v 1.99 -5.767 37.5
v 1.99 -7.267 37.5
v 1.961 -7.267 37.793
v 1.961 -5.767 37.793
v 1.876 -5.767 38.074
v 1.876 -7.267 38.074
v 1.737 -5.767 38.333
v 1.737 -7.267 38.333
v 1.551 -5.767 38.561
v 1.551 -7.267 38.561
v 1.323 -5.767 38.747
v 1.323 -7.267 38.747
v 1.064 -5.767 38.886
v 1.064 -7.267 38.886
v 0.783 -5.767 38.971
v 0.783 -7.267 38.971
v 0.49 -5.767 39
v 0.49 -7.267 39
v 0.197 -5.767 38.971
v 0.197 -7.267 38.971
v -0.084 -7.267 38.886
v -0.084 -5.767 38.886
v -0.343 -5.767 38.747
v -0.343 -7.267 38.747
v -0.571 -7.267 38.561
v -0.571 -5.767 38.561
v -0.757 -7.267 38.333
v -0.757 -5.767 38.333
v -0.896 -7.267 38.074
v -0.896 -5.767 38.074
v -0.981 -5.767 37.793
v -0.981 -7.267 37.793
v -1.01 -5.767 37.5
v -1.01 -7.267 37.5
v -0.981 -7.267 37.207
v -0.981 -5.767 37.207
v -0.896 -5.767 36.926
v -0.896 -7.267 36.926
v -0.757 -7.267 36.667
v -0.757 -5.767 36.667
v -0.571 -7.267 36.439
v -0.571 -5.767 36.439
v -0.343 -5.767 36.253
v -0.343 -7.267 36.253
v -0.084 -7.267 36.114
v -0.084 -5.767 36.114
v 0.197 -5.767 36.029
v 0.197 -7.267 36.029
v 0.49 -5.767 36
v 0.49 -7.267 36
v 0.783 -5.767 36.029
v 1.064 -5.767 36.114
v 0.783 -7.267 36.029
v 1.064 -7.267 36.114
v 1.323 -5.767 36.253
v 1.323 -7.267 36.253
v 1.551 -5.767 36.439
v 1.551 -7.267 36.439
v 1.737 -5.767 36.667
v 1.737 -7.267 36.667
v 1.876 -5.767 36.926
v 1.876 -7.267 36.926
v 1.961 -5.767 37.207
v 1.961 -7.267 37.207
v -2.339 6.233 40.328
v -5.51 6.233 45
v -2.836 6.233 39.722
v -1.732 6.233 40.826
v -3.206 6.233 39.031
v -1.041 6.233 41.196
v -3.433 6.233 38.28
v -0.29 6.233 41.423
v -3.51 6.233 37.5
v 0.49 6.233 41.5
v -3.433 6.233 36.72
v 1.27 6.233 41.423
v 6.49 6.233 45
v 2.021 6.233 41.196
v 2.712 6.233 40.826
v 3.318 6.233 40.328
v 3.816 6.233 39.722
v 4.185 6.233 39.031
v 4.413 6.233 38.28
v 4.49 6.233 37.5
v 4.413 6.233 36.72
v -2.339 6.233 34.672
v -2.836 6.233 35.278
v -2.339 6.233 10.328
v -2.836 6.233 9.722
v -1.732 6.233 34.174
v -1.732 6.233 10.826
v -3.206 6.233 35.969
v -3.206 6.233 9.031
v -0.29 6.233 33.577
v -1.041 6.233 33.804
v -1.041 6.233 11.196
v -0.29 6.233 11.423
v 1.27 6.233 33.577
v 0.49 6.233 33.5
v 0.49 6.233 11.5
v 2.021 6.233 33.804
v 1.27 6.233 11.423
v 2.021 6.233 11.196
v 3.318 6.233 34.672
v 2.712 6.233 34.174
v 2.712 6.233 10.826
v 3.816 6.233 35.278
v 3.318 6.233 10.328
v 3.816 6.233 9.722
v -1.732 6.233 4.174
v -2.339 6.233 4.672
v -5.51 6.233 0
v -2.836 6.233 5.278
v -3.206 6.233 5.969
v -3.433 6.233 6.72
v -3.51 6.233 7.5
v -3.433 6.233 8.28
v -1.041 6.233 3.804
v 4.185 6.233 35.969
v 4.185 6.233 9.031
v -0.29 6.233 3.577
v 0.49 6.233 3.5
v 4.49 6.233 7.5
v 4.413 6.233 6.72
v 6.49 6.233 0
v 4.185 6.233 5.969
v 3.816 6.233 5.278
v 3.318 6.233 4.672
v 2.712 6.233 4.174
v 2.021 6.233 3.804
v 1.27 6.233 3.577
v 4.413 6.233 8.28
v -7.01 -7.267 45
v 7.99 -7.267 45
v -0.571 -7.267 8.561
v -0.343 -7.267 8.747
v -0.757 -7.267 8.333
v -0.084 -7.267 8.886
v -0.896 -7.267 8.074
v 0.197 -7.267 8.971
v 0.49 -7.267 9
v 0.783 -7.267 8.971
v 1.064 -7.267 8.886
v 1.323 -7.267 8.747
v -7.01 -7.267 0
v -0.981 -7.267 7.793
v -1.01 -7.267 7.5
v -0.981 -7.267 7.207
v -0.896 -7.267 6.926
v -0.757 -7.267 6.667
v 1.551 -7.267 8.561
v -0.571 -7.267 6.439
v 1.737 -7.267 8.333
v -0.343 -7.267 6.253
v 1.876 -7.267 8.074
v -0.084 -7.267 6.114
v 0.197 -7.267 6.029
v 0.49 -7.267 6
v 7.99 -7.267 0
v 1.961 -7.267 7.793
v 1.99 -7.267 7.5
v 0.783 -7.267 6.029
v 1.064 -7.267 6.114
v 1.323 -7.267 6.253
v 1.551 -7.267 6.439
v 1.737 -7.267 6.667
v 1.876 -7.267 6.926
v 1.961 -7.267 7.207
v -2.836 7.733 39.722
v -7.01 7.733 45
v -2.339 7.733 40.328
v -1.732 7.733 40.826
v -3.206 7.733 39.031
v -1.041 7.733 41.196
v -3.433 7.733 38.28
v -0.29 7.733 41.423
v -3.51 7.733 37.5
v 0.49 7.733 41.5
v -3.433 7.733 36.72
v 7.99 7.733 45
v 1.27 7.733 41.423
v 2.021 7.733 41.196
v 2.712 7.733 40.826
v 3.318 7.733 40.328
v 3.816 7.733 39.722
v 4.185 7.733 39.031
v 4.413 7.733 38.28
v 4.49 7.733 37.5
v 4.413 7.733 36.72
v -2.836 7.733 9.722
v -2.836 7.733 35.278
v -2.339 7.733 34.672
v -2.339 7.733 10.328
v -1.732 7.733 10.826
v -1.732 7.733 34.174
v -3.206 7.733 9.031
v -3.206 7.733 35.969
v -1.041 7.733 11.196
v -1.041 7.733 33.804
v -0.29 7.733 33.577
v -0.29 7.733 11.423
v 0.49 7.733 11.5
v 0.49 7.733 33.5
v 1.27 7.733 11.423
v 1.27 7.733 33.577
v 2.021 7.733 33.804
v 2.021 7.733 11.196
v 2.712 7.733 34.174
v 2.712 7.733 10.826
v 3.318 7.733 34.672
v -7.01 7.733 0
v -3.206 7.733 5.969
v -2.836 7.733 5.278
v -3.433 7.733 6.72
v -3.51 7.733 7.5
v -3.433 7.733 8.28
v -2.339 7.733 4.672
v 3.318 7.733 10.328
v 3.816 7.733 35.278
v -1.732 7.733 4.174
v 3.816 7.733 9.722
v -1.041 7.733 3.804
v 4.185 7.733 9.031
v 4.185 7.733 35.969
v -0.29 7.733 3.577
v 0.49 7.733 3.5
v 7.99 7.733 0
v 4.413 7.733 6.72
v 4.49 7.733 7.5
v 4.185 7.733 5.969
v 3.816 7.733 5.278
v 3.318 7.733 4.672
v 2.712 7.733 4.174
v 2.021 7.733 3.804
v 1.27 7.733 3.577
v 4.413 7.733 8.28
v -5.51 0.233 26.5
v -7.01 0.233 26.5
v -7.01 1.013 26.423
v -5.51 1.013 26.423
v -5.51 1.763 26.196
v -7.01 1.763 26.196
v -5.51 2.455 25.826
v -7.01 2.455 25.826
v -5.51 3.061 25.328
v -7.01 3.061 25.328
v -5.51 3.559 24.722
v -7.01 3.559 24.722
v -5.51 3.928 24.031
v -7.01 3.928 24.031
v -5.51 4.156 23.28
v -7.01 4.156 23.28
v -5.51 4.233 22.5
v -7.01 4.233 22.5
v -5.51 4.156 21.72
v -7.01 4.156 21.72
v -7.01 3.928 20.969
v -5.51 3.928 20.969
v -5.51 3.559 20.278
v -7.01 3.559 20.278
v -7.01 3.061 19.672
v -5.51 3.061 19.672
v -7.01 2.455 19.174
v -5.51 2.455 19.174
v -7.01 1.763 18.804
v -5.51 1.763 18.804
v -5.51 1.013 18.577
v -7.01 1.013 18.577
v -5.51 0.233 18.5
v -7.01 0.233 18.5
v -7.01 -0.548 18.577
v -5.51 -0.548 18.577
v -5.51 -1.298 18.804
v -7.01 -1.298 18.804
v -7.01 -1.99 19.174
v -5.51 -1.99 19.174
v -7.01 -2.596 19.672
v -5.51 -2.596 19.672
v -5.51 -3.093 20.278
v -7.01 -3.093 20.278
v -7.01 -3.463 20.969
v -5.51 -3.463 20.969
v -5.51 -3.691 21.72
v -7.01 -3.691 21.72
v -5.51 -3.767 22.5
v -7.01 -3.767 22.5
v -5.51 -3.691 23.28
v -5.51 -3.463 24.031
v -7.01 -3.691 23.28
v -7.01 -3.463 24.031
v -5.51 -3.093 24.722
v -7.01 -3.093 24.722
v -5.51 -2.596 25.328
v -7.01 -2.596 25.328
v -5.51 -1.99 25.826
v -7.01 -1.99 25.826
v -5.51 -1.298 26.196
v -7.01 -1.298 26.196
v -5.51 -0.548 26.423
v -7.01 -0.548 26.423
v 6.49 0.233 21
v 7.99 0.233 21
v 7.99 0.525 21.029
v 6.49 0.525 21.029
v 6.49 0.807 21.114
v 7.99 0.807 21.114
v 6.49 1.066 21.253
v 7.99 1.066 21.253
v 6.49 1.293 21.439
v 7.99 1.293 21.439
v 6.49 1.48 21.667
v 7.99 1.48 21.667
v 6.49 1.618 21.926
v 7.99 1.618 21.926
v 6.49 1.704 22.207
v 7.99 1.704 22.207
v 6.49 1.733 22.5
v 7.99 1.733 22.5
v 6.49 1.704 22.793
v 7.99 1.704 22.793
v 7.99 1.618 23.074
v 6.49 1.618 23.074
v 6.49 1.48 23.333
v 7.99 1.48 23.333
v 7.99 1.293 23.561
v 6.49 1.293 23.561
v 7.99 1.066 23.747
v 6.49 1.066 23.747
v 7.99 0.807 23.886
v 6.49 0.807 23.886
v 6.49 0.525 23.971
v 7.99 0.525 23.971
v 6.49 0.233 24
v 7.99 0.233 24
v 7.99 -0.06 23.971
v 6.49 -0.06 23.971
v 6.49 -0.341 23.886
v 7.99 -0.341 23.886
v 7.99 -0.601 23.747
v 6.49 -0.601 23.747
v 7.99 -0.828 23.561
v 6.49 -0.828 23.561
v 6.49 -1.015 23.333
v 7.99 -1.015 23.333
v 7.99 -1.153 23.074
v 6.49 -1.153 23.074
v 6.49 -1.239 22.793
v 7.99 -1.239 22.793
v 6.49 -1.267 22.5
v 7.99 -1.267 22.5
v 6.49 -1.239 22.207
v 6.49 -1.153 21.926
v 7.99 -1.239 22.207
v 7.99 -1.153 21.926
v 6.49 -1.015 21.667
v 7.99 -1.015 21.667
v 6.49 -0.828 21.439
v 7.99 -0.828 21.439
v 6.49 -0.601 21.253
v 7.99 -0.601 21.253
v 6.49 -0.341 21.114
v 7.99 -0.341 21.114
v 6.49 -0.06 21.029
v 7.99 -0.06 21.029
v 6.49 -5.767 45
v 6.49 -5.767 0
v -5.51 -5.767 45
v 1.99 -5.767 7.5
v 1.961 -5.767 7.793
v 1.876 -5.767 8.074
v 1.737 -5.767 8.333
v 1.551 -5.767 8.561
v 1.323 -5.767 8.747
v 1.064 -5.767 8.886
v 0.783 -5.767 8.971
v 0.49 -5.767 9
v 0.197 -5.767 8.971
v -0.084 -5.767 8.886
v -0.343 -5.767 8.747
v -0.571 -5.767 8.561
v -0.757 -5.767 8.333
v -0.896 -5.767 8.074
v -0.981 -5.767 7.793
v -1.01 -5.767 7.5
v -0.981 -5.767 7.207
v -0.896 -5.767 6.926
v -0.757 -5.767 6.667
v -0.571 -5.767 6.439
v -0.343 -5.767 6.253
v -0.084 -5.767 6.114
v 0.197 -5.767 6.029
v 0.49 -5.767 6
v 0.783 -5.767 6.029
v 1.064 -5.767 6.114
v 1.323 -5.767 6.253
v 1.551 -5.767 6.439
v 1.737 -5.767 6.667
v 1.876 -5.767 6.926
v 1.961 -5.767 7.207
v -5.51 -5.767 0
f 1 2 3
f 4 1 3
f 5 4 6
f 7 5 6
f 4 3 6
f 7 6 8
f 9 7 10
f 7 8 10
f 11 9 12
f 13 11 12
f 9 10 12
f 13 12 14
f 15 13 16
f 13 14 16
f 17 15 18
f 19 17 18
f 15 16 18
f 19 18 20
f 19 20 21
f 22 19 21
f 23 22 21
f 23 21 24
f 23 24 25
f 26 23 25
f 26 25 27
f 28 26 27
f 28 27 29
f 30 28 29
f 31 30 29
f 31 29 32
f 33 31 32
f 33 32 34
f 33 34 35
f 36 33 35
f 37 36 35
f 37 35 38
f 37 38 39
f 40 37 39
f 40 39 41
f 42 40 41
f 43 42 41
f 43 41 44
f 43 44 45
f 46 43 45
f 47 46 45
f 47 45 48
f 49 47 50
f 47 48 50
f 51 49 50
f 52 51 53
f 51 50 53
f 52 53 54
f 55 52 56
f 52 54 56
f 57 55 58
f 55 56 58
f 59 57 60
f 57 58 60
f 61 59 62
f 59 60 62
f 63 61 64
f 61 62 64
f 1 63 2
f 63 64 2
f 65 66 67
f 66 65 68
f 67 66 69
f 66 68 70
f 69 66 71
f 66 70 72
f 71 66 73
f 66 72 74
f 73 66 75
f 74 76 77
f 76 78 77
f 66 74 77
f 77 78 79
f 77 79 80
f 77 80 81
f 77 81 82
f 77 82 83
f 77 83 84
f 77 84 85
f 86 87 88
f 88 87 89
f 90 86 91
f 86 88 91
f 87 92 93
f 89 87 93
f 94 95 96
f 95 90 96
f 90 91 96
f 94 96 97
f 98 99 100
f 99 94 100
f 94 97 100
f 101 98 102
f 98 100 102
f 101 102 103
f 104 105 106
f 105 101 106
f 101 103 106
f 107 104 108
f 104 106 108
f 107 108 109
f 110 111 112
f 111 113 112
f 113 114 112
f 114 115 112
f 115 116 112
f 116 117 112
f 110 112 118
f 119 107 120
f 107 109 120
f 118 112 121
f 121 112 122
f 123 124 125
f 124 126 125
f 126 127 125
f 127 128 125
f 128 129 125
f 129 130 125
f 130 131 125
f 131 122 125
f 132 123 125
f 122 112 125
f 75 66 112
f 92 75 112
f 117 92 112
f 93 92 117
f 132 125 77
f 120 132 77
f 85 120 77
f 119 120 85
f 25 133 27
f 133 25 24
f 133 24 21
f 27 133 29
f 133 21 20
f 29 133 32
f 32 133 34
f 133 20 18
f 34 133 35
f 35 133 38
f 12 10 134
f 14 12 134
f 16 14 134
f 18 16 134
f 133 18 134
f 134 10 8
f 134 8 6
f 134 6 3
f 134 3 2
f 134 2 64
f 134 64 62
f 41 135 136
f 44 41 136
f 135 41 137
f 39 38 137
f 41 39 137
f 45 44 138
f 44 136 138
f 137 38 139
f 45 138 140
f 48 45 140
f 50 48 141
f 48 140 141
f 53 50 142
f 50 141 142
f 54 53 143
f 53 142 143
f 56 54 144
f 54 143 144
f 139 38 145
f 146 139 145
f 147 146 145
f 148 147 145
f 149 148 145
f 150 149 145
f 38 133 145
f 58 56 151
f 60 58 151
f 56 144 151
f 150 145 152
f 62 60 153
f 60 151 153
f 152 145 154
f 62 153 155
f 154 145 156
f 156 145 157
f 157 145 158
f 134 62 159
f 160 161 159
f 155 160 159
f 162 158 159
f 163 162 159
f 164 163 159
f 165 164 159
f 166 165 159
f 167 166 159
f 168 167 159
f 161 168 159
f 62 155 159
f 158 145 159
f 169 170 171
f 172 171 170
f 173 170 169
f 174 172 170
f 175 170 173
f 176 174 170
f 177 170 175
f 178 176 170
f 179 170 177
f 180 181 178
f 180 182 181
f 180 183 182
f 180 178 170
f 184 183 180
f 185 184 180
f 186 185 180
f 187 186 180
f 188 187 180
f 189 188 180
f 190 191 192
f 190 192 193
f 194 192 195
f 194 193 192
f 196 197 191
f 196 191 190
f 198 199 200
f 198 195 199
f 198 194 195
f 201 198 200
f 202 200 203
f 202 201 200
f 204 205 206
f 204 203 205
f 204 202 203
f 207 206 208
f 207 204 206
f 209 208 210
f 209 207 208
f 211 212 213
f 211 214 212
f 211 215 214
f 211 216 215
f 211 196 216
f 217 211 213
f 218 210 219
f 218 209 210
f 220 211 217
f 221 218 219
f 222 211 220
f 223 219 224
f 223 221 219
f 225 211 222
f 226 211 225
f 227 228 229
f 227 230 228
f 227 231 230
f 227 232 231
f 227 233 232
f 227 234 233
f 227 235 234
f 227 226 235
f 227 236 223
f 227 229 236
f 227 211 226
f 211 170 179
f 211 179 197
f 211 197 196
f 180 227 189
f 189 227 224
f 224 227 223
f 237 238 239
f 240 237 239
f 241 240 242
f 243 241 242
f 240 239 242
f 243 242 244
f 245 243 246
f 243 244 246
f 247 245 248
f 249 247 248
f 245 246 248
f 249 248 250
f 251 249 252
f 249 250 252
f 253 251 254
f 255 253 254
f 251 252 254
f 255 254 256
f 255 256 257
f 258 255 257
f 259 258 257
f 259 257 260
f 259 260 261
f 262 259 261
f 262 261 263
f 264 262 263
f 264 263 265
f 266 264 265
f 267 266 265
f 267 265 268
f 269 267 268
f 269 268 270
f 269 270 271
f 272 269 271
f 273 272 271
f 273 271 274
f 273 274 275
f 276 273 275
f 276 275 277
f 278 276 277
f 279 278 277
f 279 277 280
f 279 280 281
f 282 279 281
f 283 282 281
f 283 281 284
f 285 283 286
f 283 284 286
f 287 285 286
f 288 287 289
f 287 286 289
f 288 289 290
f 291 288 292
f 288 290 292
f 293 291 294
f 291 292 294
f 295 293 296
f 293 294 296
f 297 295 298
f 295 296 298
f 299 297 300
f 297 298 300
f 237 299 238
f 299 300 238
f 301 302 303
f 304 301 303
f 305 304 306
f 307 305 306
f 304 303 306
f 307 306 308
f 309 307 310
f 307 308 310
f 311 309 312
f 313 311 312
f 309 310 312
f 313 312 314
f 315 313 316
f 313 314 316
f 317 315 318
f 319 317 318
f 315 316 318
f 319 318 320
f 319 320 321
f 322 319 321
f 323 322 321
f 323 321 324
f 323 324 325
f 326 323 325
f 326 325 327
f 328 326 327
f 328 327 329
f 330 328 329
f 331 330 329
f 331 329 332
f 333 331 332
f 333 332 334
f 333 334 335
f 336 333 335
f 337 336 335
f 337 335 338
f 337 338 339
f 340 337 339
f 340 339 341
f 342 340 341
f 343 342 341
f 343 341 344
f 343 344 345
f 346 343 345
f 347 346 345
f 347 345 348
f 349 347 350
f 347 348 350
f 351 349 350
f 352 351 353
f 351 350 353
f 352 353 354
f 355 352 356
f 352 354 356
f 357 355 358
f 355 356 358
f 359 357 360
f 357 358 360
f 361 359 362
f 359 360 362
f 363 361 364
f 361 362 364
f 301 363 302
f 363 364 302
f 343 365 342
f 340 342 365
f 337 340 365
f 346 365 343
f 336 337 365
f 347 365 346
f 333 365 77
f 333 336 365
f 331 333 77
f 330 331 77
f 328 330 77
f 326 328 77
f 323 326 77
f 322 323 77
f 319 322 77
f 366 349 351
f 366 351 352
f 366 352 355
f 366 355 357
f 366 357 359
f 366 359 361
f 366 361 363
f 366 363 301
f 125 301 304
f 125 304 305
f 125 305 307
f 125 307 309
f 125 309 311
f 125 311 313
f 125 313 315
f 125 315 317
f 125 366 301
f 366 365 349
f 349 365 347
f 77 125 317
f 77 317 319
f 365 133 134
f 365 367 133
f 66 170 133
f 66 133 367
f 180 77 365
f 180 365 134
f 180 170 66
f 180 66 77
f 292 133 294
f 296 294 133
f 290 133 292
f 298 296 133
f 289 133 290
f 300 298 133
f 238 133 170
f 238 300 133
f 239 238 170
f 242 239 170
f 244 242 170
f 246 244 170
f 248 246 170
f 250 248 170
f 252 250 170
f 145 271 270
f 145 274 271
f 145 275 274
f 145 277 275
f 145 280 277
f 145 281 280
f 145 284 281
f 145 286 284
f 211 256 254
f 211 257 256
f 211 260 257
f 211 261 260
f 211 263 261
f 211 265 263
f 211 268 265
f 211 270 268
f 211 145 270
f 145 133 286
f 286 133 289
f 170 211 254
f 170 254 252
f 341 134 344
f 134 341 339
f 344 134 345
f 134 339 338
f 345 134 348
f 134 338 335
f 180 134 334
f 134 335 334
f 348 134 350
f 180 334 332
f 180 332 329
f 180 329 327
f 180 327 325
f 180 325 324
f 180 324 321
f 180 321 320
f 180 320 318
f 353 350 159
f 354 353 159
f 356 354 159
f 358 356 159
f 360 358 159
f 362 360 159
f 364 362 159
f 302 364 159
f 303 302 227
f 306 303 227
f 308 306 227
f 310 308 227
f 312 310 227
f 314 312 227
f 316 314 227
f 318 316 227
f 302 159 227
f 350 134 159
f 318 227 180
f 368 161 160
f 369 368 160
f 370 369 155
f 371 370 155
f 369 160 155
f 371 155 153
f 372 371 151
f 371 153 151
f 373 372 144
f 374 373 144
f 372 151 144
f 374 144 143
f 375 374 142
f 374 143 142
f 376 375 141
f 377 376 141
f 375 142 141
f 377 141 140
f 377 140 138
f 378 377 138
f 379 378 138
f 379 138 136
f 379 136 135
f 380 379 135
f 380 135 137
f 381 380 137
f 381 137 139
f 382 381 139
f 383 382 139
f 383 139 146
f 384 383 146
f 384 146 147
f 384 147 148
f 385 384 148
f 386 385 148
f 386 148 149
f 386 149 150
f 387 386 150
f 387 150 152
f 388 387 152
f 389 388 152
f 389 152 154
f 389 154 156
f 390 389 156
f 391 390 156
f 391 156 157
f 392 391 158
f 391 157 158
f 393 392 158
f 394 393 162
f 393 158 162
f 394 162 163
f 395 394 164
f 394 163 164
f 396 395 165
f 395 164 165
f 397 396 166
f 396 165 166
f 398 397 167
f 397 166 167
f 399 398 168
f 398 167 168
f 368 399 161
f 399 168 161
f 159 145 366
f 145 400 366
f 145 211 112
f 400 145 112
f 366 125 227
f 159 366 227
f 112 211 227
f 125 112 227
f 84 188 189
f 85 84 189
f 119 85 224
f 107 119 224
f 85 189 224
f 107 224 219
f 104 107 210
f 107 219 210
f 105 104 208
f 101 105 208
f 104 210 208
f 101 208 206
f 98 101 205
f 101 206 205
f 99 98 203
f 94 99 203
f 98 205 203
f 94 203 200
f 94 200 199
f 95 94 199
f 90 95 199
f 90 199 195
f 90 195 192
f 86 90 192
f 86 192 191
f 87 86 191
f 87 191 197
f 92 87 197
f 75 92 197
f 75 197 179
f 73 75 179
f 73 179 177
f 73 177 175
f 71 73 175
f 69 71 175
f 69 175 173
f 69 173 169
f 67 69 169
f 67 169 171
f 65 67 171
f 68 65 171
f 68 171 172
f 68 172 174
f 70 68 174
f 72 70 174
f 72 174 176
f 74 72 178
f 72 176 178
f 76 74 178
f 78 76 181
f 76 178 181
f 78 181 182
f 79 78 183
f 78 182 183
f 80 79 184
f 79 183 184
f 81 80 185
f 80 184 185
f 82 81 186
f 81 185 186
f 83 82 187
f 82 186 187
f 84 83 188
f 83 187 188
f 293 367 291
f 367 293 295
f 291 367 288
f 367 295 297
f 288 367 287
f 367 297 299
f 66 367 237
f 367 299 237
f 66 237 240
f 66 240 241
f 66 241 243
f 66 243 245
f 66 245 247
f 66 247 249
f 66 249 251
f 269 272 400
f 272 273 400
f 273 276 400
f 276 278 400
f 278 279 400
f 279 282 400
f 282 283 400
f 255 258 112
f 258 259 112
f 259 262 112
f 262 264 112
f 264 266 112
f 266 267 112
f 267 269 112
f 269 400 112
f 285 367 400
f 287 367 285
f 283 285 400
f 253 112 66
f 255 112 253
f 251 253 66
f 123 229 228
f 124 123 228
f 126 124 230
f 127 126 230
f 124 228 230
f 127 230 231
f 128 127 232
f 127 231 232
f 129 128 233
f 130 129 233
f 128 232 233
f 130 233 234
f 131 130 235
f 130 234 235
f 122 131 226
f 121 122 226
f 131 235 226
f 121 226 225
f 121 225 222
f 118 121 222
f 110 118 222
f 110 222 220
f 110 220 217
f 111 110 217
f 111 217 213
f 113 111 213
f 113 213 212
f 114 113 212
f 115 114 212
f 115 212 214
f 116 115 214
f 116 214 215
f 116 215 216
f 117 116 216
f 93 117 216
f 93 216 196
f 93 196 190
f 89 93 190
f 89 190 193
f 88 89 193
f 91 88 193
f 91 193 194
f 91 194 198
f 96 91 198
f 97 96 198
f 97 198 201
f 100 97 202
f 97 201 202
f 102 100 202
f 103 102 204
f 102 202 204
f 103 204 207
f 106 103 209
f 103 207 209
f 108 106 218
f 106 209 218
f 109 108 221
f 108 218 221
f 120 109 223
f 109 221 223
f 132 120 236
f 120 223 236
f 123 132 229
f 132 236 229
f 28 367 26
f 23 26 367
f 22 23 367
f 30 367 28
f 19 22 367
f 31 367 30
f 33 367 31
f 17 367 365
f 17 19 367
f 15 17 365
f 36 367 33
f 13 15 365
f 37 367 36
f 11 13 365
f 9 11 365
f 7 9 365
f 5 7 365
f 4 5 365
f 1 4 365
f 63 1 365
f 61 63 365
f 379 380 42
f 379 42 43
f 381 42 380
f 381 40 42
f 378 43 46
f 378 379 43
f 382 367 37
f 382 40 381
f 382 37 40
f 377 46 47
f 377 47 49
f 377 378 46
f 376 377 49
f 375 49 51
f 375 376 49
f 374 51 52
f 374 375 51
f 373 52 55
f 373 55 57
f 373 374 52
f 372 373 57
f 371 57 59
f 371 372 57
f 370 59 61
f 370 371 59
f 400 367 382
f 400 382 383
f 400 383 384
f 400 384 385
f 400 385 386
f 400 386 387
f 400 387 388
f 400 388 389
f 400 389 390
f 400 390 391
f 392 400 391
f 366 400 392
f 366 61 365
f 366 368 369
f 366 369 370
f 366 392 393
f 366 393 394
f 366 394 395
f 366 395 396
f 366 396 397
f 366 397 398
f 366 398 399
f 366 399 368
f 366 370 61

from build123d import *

# Parameters (mm, degrees)
SKETCH_1_W          = 15
SKETCH_1_H          = 15
SKETCH_1_W_2        = 12
SKETCH_1_H_2        = 12
EXTRUDE_2_DEPTH     = 45
SKETCH_2_R          = 1.5
CUT_EXTRUDE_1_DEPTH = 10
SKETCH_3_R          = 1.5
CUT_EXTRUDE_2_DEPTH = 10
SKETCH_4_R          = 4
CUT_EXTRUDE_3_DEPTH = 10
SKETCH_5_R          = 4
CUT_EXTRUDE_4_DEPTH = 10


with BuildPart() as part:
    # ｽｹｯﾁ1 → ﾎﾞｽ - 押し出し2 (new body)
    with BuildSketch(Plane.XY):
        with Locations((0.489915859, 0.232626086)):
            Rectangle(SKETCH_1_W, SKETCH_1_H)
        with Locations((0.489915859, 0.232626086)):
            Rectangle(SKETCH_1_W_2, SKETCH_1_H_2, mode=Mode.SUBTRACT)
    extrude(amount=EXTRUDE_2_DEPTH)

    # ｽｹｯﾁ2 → ｶｯﾄ - 押し出し1 (cut)
    with BuildSketch(Plane(origin=(7.989915859, 0, 0), x_dir=(0, 0, -1), z_dir=(1, 0, 0))):
        with Locations((-22.5, 0.232626086)):
            Circle(SKETCH_2_R)
    extrude(amount=-CUT_EXTRUDE_1_DEPTH, mode=Mode.SUBTRACT)

    # ｽｹｯﾁ3 → ｶｯﾄ - 押し出し2 (cut)
    with BuildSketch(Plane.XZ.offset(7.267373914)):
        with Locations((0.489915859, 37.5)):
            Circle(SKETCH_3_R)
        with Locations((0.489915859, 7.5)):
            Circle(SKETCH_3_R)
    extrude(amount=-CUT_EXTRUDE_2_DEPTH, mode=Mode.SUBTRACT)

    # ｽｹｯﾁ4 → ｶｯﾄ - 押し出し3 (cut)
    with BuildSketch(Plane.ZY.offset(7.010084141)):
        with Locations((22.5, 0.232626086)):
            Circle(SKETCH_4_R)
    extrude(amount=-CUT_EXTRUDE_3_DEPTH, mode=Mode.SUBTRACT)

    # ｽｹｯﾁ5 → ｶｯﾄ - 押し出し4 (cut)
    with BuildSketch(Plane(origin=(0, 7.732626086, 0), x_dir=(1, 0, 0), z_dir=(0, 1, 0))):
        with Locations((0.489915859, -7.5)):
            Circle(SKETCH_5_R)
        with Locations((0.489915859, -37.5)):
            Circle(SKETCH_5_R)
    extrude(amount=-CUT_EXTRUDE_4_DEPTH, mode=Mode.SUBTRACT)


solid = part.part
